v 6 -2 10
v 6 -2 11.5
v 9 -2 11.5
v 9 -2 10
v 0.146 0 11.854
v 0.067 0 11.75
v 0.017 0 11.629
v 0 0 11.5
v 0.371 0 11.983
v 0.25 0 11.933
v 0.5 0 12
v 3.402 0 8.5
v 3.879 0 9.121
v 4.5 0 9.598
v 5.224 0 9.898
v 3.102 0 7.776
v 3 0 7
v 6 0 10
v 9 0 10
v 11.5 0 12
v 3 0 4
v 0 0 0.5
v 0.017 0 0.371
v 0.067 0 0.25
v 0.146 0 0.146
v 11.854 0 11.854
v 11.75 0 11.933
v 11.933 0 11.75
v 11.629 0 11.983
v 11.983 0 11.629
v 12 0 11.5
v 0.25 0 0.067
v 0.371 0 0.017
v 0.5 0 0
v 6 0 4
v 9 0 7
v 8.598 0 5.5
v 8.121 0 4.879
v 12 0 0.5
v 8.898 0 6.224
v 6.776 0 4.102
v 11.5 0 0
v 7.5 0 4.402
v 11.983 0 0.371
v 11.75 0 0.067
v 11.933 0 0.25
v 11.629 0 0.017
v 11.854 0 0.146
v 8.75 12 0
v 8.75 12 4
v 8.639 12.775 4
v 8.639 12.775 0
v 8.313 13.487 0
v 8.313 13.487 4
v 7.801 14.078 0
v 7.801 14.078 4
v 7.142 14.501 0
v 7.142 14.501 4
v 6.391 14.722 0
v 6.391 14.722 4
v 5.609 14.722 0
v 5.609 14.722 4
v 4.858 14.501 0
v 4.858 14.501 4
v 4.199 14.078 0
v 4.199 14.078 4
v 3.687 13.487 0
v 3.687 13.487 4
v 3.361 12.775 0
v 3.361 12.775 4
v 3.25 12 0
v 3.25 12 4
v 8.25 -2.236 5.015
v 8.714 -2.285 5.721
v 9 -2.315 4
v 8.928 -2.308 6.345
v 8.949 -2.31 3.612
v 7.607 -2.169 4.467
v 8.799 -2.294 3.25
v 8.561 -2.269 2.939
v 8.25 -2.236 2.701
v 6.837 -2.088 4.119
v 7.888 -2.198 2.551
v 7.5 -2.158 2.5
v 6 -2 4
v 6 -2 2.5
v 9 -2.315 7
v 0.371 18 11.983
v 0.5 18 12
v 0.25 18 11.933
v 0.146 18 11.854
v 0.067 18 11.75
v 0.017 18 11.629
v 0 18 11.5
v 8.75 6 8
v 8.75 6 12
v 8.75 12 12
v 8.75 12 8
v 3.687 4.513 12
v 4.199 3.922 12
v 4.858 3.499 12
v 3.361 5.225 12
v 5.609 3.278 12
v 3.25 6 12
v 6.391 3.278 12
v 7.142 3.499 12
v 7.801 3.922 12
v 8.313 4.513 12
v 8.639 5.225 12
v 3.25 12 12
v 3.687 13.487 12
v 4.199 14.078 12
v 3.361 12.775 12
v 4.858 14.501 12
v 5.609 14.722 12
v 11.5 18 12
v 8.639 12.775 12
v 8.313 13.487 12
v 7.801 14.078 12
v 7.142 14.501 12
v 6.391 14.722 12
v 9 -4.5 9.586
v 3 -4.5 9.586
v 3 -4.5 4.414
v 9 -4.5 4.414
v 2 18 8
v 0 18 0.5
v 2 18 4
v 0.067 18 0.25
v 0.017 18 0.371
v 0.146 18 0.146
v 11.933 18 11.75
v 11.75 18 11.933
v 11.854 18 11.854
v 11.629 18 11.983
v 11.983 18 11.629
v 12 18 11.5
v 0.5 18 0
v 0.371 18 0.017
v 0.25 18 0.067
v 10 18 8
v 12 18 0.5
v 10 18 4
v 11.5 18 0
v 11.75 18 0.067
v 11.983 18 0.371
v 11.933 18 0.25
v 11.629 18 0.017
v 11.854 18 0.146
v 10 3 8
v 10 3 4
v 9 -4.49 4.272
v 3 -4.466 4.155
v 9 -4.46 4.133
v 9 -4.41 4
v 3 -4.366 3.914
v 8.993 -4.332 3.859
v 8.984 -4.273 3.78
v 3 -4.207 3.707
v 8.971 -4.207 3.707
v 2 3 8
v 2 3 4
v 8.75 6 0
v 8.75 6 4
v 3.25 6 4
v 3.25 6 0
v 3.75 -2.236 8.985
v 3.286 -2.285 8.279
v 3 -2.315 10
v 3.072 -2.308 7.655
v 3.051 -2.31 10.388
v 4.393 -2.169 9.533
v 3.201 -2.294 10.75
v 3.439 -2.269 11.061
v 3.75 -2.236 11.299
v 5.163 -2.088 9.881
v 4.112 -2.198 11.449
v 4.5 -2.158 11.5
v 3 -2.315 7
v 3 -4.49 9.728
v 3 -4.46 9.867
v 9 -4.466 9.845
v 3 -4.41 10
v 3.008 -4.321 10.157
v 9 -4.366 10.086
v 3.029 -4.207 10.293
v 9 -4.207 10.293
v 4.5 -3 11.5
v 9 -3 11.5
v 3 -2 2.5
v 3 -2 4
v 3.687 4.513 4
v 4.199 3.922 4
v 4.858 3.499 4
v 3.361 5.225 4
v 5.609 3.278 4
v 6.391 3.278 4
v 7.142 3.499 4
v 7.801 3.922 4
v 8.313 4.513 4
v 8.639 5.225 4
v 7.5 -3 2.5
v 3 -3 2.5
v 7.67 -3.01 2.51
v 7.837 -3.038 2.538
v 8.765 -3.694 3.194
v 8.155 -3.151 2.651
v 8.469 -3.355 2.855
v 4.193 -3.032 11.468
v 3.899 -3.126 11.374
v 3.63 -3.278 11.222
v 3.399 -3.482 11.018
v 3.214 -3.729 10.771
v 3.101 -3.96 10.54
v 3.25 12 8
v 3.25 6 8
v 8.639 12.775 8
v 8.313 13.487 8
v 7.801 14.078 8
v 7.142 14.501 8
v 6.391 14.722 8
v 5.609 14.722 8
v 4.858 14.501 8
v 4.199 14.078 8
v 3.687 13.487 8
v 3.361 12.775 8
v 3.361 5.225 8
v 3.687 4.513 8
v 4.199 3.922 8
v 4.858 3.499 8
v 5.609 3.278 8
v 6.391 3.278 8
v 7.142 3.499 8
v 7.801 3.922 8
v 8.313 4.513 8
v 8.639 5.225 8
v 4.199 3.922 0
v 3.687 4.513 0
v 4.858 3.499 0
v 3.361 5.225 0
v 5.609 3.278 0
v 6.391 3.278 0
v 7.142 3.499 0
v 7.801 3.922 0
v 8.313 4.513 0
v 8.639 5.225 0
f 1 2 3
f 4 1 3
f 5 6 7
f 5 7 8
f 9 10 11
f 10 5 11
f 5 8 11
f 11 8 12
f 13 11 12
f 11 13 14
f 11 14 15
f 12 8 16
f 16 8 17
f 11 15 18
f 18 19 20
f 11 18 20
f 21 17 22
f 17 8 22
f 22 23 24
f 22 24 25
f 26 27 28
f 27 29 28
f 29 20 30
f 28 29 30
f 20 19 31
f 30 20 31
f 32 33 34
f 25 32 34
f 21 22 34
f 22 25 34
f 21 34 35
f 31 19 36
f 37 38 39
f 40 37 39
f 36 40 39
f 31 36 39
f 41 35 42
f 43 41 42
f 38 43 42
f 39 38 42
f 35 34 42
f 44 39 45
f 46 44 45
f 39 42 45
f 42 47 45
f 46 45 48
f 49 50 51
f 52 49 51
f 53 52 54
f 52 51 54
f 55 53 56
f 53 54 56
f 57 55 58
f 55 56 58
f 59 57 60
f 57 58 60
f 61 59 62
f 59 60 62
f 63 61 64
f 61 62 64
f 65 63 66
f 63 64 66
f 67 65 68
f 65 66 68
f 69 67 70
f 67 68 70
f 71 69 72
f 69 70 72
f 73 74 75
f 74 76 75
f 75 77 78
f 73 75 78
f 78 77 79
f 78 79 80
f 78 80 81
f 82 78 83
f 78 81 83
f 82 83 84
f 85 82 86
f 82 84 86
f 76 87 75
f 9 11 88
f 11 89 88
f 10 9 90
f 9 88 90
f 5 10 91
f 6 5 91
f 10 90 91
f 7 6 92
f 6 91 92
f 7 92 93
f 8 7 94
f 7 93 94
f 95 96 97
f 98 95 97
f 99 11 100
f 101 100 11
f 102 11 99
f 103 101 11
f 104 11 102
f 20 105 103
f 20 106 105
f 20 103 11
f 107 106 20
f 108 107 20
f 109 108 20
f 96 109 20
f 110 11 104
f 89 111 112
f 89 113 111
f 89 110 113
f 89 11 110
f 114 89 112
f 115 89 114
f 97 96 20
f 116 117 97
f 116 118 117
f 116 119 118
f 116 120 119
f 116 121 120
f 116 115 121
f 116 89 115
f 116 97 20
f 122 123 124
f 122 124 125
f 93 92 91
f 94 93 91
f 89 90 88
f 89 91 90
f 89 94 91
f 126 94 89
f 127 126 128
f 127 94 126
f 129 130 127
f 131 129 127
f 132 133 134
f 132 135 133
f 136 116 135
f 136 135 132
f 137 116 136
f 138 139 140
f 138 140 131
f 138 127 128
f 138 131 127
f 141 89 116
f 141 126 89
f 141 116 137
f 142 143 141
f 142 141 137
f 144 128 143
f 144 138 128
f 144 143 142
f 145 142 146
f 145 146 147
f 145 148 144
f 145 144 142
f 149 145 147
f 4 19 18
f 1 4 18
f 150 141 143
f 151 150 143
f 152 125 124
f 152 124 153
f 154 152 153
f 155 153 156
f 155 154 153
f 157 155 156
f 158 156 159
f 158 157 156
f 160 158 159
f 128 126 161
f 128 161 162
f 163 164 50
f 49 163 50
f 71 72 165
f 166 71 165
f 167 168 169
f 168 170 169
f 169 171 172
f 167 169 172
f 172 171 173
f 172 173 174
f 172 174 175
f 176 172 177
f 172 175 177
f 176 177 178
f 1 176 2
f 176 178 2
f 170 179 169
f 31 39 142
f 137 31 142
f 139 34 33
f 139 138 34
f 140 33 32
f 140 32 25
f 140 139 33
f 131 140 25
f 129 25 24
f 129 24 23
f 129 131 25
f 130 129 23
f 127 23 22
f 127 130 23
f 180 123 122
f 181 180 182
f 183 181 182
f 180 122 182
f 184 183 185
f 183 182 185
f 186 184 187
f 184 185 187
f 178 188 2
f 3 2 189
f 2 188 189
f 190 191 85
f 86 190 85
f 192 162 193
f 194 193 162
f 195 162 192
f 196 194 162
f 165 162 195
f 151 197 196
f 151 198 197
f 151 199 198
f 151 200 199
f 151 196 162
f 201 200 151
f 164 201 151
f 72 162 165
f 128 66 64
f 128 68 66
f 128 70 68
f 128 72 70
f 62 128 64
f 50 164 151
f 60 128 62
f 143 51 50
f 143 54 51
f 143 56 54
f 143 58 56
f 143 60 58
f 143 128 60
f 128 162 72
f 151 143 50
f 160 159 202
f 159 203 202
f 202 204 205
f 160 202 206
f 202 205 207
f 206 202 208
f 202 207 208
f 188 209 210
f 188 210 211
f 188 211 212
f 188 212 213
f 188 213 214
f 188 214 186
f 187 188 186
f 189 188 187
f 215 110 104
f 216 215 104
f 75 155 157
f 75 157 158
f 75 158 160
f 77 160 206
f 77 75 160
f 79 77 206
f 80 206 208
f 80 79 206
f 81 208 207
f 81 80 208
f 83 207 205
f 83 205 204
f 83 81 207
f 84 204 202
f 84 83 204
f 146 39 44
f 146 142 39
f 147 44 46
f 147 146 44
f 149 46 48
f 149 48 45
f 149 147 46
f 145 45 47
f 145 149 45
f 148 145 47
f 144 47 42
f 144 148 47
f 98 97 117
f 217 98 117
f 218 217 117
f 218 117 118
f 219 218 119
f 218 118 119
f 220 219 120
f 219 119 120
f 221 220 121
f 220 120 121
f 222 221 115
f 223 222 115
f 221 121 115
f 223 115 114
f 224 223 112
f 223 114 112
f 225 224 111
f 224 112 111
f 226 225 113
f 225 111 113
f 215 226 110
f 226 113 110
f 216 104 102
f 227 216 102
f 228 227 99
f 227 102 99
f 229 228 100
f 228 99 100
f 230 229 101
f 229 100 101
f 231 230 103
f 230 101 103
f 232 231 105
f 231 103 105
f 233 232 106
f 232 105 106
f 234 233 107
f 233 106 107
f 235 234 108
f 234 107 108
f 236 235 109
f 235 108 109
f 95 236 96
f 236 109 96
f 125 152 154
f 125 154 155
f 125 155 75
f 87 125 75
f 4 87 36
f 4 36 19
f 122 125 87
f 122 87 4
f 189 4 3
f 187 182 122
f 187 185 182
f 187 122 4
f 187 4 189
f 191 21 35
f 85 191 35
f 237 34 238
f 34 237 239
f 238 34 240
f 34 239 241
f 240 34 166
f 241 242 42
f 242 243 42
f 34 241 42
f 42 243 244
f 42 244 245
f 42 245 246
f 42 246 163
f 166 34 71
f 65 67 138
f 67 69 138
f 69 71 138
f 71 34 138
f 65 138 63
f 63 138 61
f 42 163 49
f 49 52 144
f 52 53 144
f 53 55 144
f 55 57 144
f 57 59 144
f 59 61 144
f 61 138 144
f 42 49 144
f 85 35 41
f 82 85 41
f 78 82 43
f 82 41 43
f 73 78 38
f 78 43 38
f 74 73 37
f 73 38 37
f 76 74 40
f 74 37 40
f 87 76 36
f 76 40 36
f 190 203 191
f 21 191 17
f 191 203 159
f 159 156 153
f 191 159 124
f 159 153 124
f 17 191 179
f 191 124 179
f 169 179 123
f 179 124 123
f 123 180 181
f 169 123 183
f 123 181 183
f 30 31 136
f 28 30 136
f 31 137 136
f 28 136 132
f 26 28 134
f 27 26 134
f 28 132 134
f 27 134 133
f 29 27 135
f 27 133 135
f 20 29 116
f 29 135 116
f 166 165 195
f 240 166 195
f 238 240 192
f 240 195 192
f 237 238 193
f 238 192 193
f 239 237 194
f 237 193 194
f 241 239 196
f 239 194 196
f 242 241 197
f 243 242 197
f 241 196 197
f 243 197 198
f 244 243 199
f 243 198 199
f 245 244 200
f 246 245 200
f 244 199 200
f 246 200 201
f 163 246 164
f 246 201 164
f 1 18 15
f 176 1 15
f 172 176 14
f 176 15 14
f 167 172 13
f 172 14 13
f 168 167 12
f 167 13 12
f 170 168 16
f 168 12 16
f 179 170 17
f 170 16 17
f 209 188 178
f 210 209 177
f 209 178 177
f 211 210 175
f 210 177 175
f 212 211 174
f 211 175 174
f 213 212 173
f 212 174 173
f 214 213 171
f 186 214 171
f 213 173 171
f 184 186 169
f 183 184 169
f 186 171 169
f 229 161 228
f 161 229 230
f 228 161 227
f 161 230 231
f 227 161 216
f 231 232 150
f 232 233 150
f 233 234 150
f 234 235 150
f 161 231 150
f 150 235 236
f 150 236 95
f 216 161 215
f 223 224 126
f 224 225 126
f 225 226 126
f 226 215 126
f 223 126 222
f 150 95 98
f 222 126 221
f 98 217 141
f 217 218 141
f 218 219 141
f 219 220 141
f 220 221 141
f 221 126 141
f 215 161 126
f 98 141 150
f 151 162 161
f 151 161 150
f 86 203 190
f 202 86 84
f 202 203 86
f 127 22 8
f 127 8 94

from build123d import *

# Parameters (mm, degrees)
SKETCH_1_W               = 12
SKETCH_1_H               = 18
EXTRUDE_1_DEPTH          = 12
CUT_EXTRUDE_1_DEPTH      = 12
SKETCH_3_W               = 8
SKETCH_3_H               = 4
CUT_EXTRUDE_2_DEPTH      = 15
EXTRUDE_2_DEPTH          = 4.5
SKETCH_5_W               = 6
SKETCH_5_H               = 9
EXTRUDE_3_DEPTH          = 2.5
FILLET_2_R               = 0.5
CHAMFER_3_SIZE           = 1.5
CHAMFER_4_SIZE           = 1.5
FILLET_3_R               = 1
CUT_EXTRUDE_3_REACH      = 13.5
CUT_EXTRUDE_3_END_RADIUS = 3
CUT_EXTRUDE_4_REACH      = 11.5
CUT_EXTRUDE_4_END_RADIUS = 3
FILLET_6_R               = 1.5
FILLET_7_R               = 1.5


with BuildPart() as part:
    # 草图1 → 拉伸1 (new body)
    with BuildSketch(Plane.XY):
        with Locations((6, 9)):
            Rectangle(SKETCH_1_W, SKETCH_1_H)
    extrude(amount=EXTRUDE_1_DEPTH)

    # 草图2 → 切除-拉伸1 (cut)
    with BuildSketch(Plane.XY.offset(12)):
        with BuildLine():
            Line((3.25, 12.000000088), (3.25, 5.999999721))
            ThreePointArc((3.25, 5.999999721), (6, 3.25), (8.75, 5.999999721))
            Line((8.75, 5.999999721), (8.75, 12.000000088))
            ThreePointArc((8.75, 12.000000088), (6, 14.75), (3.25, 12.000000088))
        make_face()
    extrude(amount=-CUT_EXTRUDE_1_DEPTH, mode=Mode.SUBTRACT)

    # 草图3 → 切除-拉伸2 (cut)
    with BuildSketch(Plane(origin=(0, 18, 0), x_dir=(1, 0, 0), z_dir=(0, 1, 0))):
        with Locations((6, -6)):
            Rectangle(SKETCH_3_W, SKETCH_3_H)
    extrude(amount=-CUT_EXTRUDE_2_DEPTH, mode=Mode.SUBTRACT)

    # 草图4 → 拉伸2 (add)
    with BuildSketch(Plane.XZ):
        with BuildLine():
            Line((9, 10), (6, 10))
            ThreePointArc((6, 10), (3.878679656, 9.121320344), (3, 7))
            Line((3, 7), (3, 4))
            Line((3, 4), (6, 4))
            ThreePointArc((6, 4), (8.121320344, 4.878679656), (9, 7))
            Line((9, 7), (9, 10))
        make_face()
    extrude(amount=EXTRUDE_2_DEPTH)

    # 草图5 → 拉伸3 (add)
    with BuildSketch(Plane.XZ.offset(4.5)):
        with Locations((6, 7)):
            Rectangle(SKETCH_5_W, SKETCH_5_H)
    extrude(amount=-EXTRUDE_3_DEPTH)

    # 圆角2
    fillet_2_edges = [part.edges().sort_by_distance(p)[0] for p in [
        (12, 9, 12),
        (0, 9, 12),
        (12, 9, 0),
        (0, 9, 0),
    ]]
    fillet(fillet_2_edges, radius=FILLET_2_R)

    # 倒角3
    chamfer_3_edges = [part.edges().sort_by_distance(p)[0] for p in [
        (6, -4.5, 11.5),
    ]]
    chamfer(chamfer_3_edges, length=CHAMFER_3_SIZE)

    # 倒角4
    chamfer_4_edges = [part.edges().sort_by_distance(p)[0] for p in [
        (6, -4.5, 2.5),
    ]]
    chamfer(chamfer_4_edges, length=CHAMFER_4_SIZE)

    # 圆角3
    fillet_3_edges = [part.edges().sort_by_distance(p)[0] for p in [
        (6, -4.5, 10),
        (6, -4.5, 4),
    ]]
    fillet(fillet_3_edges, radius=FILLET_3_R)

    # 切除-拉伸3: up to this cylinder (the profile starts outside it)
    cut_extrude_3_end = Plane(origin=(6, -2.105104, 7), z_dir=(0, 1, 0)) * Cylinder(CUT_EXTRUDE_3_END_RADIUS, 34, mode=Mode.PRIVATE)
    # 草图8 → 切除-拉伸3 (cut, up to the surface)
    with BuildSketch(Plane.XY.offset(11.5), mode=Mode.PRIVATE) as cut_extrude_3_sk1:
        Polygon((6, -2), (3, -2), (3, -2.315312706), align=None)
    cut_extrude_3_tool1 = extrude(cut_extrude_3_sk1.sketch, amount=-CUT_EXTRUDE_3_REACH, mode=Mode.PRIVATE) - cut_extrude_3_end
    add(cut_extrude_3_tool1.solids().sort_by_distance((4, -2.105104, 11.5))[0], mode=Mode.SUBTRACT)

    # 切除-拉伸4: up to this cylinder (the profile starts outside it)
    cut_extrude_4_end = Plane(origin=(6, -2.105104, 7), z_dir=(0, 1, 0)) * Cylinder(CUT_EXTRUDE_4_END_RADIUS, 30, mode=Mode.PRIVATE)
    # 草图9 → 切除-拉伸4 (cut, up to the surface)
    with BuildSketch(Plane(origin=(0, 0, 2.5), x_dir=(-1, 0, 0), z_dir=(0, 0, -1)), mode=Mode.PRIVATE) as cut_extrude_4_sk1:
        Polygon((-6, -2), (-9, -2), (-9, -2.315312706), align=None)
    cut_extrude_4_tool1 = extrude(cut_extrude_4_sk1.sketch, amount=-CUT_EXTRUDE_4_REACH, mode=Mode.PRIVATE) - cut_extrude_4_end
    add(cut_extrude_4_tool1.solids().sort_by_distance((8, -2.105104, 2.5))[0], mode=Mode.SUBTRACT)

    # 圆角6
    fillet_6_edges = [part.edges().sort_by_distance(p)[0] for p in [
        (9, -2.657656353, 2.5),
    ]]
    fillet(fillet_6_edges, radius=FILLET_6_R)

    # 圆角7
    fillet_7_edges = [part.edges().sort_by_distance(p)[0] for p in [
        (3, -2.657656353, 11.5),
    ]]
    fillet(fillet_7_edges, radius=FILLET_7_R)


solid = part.part
